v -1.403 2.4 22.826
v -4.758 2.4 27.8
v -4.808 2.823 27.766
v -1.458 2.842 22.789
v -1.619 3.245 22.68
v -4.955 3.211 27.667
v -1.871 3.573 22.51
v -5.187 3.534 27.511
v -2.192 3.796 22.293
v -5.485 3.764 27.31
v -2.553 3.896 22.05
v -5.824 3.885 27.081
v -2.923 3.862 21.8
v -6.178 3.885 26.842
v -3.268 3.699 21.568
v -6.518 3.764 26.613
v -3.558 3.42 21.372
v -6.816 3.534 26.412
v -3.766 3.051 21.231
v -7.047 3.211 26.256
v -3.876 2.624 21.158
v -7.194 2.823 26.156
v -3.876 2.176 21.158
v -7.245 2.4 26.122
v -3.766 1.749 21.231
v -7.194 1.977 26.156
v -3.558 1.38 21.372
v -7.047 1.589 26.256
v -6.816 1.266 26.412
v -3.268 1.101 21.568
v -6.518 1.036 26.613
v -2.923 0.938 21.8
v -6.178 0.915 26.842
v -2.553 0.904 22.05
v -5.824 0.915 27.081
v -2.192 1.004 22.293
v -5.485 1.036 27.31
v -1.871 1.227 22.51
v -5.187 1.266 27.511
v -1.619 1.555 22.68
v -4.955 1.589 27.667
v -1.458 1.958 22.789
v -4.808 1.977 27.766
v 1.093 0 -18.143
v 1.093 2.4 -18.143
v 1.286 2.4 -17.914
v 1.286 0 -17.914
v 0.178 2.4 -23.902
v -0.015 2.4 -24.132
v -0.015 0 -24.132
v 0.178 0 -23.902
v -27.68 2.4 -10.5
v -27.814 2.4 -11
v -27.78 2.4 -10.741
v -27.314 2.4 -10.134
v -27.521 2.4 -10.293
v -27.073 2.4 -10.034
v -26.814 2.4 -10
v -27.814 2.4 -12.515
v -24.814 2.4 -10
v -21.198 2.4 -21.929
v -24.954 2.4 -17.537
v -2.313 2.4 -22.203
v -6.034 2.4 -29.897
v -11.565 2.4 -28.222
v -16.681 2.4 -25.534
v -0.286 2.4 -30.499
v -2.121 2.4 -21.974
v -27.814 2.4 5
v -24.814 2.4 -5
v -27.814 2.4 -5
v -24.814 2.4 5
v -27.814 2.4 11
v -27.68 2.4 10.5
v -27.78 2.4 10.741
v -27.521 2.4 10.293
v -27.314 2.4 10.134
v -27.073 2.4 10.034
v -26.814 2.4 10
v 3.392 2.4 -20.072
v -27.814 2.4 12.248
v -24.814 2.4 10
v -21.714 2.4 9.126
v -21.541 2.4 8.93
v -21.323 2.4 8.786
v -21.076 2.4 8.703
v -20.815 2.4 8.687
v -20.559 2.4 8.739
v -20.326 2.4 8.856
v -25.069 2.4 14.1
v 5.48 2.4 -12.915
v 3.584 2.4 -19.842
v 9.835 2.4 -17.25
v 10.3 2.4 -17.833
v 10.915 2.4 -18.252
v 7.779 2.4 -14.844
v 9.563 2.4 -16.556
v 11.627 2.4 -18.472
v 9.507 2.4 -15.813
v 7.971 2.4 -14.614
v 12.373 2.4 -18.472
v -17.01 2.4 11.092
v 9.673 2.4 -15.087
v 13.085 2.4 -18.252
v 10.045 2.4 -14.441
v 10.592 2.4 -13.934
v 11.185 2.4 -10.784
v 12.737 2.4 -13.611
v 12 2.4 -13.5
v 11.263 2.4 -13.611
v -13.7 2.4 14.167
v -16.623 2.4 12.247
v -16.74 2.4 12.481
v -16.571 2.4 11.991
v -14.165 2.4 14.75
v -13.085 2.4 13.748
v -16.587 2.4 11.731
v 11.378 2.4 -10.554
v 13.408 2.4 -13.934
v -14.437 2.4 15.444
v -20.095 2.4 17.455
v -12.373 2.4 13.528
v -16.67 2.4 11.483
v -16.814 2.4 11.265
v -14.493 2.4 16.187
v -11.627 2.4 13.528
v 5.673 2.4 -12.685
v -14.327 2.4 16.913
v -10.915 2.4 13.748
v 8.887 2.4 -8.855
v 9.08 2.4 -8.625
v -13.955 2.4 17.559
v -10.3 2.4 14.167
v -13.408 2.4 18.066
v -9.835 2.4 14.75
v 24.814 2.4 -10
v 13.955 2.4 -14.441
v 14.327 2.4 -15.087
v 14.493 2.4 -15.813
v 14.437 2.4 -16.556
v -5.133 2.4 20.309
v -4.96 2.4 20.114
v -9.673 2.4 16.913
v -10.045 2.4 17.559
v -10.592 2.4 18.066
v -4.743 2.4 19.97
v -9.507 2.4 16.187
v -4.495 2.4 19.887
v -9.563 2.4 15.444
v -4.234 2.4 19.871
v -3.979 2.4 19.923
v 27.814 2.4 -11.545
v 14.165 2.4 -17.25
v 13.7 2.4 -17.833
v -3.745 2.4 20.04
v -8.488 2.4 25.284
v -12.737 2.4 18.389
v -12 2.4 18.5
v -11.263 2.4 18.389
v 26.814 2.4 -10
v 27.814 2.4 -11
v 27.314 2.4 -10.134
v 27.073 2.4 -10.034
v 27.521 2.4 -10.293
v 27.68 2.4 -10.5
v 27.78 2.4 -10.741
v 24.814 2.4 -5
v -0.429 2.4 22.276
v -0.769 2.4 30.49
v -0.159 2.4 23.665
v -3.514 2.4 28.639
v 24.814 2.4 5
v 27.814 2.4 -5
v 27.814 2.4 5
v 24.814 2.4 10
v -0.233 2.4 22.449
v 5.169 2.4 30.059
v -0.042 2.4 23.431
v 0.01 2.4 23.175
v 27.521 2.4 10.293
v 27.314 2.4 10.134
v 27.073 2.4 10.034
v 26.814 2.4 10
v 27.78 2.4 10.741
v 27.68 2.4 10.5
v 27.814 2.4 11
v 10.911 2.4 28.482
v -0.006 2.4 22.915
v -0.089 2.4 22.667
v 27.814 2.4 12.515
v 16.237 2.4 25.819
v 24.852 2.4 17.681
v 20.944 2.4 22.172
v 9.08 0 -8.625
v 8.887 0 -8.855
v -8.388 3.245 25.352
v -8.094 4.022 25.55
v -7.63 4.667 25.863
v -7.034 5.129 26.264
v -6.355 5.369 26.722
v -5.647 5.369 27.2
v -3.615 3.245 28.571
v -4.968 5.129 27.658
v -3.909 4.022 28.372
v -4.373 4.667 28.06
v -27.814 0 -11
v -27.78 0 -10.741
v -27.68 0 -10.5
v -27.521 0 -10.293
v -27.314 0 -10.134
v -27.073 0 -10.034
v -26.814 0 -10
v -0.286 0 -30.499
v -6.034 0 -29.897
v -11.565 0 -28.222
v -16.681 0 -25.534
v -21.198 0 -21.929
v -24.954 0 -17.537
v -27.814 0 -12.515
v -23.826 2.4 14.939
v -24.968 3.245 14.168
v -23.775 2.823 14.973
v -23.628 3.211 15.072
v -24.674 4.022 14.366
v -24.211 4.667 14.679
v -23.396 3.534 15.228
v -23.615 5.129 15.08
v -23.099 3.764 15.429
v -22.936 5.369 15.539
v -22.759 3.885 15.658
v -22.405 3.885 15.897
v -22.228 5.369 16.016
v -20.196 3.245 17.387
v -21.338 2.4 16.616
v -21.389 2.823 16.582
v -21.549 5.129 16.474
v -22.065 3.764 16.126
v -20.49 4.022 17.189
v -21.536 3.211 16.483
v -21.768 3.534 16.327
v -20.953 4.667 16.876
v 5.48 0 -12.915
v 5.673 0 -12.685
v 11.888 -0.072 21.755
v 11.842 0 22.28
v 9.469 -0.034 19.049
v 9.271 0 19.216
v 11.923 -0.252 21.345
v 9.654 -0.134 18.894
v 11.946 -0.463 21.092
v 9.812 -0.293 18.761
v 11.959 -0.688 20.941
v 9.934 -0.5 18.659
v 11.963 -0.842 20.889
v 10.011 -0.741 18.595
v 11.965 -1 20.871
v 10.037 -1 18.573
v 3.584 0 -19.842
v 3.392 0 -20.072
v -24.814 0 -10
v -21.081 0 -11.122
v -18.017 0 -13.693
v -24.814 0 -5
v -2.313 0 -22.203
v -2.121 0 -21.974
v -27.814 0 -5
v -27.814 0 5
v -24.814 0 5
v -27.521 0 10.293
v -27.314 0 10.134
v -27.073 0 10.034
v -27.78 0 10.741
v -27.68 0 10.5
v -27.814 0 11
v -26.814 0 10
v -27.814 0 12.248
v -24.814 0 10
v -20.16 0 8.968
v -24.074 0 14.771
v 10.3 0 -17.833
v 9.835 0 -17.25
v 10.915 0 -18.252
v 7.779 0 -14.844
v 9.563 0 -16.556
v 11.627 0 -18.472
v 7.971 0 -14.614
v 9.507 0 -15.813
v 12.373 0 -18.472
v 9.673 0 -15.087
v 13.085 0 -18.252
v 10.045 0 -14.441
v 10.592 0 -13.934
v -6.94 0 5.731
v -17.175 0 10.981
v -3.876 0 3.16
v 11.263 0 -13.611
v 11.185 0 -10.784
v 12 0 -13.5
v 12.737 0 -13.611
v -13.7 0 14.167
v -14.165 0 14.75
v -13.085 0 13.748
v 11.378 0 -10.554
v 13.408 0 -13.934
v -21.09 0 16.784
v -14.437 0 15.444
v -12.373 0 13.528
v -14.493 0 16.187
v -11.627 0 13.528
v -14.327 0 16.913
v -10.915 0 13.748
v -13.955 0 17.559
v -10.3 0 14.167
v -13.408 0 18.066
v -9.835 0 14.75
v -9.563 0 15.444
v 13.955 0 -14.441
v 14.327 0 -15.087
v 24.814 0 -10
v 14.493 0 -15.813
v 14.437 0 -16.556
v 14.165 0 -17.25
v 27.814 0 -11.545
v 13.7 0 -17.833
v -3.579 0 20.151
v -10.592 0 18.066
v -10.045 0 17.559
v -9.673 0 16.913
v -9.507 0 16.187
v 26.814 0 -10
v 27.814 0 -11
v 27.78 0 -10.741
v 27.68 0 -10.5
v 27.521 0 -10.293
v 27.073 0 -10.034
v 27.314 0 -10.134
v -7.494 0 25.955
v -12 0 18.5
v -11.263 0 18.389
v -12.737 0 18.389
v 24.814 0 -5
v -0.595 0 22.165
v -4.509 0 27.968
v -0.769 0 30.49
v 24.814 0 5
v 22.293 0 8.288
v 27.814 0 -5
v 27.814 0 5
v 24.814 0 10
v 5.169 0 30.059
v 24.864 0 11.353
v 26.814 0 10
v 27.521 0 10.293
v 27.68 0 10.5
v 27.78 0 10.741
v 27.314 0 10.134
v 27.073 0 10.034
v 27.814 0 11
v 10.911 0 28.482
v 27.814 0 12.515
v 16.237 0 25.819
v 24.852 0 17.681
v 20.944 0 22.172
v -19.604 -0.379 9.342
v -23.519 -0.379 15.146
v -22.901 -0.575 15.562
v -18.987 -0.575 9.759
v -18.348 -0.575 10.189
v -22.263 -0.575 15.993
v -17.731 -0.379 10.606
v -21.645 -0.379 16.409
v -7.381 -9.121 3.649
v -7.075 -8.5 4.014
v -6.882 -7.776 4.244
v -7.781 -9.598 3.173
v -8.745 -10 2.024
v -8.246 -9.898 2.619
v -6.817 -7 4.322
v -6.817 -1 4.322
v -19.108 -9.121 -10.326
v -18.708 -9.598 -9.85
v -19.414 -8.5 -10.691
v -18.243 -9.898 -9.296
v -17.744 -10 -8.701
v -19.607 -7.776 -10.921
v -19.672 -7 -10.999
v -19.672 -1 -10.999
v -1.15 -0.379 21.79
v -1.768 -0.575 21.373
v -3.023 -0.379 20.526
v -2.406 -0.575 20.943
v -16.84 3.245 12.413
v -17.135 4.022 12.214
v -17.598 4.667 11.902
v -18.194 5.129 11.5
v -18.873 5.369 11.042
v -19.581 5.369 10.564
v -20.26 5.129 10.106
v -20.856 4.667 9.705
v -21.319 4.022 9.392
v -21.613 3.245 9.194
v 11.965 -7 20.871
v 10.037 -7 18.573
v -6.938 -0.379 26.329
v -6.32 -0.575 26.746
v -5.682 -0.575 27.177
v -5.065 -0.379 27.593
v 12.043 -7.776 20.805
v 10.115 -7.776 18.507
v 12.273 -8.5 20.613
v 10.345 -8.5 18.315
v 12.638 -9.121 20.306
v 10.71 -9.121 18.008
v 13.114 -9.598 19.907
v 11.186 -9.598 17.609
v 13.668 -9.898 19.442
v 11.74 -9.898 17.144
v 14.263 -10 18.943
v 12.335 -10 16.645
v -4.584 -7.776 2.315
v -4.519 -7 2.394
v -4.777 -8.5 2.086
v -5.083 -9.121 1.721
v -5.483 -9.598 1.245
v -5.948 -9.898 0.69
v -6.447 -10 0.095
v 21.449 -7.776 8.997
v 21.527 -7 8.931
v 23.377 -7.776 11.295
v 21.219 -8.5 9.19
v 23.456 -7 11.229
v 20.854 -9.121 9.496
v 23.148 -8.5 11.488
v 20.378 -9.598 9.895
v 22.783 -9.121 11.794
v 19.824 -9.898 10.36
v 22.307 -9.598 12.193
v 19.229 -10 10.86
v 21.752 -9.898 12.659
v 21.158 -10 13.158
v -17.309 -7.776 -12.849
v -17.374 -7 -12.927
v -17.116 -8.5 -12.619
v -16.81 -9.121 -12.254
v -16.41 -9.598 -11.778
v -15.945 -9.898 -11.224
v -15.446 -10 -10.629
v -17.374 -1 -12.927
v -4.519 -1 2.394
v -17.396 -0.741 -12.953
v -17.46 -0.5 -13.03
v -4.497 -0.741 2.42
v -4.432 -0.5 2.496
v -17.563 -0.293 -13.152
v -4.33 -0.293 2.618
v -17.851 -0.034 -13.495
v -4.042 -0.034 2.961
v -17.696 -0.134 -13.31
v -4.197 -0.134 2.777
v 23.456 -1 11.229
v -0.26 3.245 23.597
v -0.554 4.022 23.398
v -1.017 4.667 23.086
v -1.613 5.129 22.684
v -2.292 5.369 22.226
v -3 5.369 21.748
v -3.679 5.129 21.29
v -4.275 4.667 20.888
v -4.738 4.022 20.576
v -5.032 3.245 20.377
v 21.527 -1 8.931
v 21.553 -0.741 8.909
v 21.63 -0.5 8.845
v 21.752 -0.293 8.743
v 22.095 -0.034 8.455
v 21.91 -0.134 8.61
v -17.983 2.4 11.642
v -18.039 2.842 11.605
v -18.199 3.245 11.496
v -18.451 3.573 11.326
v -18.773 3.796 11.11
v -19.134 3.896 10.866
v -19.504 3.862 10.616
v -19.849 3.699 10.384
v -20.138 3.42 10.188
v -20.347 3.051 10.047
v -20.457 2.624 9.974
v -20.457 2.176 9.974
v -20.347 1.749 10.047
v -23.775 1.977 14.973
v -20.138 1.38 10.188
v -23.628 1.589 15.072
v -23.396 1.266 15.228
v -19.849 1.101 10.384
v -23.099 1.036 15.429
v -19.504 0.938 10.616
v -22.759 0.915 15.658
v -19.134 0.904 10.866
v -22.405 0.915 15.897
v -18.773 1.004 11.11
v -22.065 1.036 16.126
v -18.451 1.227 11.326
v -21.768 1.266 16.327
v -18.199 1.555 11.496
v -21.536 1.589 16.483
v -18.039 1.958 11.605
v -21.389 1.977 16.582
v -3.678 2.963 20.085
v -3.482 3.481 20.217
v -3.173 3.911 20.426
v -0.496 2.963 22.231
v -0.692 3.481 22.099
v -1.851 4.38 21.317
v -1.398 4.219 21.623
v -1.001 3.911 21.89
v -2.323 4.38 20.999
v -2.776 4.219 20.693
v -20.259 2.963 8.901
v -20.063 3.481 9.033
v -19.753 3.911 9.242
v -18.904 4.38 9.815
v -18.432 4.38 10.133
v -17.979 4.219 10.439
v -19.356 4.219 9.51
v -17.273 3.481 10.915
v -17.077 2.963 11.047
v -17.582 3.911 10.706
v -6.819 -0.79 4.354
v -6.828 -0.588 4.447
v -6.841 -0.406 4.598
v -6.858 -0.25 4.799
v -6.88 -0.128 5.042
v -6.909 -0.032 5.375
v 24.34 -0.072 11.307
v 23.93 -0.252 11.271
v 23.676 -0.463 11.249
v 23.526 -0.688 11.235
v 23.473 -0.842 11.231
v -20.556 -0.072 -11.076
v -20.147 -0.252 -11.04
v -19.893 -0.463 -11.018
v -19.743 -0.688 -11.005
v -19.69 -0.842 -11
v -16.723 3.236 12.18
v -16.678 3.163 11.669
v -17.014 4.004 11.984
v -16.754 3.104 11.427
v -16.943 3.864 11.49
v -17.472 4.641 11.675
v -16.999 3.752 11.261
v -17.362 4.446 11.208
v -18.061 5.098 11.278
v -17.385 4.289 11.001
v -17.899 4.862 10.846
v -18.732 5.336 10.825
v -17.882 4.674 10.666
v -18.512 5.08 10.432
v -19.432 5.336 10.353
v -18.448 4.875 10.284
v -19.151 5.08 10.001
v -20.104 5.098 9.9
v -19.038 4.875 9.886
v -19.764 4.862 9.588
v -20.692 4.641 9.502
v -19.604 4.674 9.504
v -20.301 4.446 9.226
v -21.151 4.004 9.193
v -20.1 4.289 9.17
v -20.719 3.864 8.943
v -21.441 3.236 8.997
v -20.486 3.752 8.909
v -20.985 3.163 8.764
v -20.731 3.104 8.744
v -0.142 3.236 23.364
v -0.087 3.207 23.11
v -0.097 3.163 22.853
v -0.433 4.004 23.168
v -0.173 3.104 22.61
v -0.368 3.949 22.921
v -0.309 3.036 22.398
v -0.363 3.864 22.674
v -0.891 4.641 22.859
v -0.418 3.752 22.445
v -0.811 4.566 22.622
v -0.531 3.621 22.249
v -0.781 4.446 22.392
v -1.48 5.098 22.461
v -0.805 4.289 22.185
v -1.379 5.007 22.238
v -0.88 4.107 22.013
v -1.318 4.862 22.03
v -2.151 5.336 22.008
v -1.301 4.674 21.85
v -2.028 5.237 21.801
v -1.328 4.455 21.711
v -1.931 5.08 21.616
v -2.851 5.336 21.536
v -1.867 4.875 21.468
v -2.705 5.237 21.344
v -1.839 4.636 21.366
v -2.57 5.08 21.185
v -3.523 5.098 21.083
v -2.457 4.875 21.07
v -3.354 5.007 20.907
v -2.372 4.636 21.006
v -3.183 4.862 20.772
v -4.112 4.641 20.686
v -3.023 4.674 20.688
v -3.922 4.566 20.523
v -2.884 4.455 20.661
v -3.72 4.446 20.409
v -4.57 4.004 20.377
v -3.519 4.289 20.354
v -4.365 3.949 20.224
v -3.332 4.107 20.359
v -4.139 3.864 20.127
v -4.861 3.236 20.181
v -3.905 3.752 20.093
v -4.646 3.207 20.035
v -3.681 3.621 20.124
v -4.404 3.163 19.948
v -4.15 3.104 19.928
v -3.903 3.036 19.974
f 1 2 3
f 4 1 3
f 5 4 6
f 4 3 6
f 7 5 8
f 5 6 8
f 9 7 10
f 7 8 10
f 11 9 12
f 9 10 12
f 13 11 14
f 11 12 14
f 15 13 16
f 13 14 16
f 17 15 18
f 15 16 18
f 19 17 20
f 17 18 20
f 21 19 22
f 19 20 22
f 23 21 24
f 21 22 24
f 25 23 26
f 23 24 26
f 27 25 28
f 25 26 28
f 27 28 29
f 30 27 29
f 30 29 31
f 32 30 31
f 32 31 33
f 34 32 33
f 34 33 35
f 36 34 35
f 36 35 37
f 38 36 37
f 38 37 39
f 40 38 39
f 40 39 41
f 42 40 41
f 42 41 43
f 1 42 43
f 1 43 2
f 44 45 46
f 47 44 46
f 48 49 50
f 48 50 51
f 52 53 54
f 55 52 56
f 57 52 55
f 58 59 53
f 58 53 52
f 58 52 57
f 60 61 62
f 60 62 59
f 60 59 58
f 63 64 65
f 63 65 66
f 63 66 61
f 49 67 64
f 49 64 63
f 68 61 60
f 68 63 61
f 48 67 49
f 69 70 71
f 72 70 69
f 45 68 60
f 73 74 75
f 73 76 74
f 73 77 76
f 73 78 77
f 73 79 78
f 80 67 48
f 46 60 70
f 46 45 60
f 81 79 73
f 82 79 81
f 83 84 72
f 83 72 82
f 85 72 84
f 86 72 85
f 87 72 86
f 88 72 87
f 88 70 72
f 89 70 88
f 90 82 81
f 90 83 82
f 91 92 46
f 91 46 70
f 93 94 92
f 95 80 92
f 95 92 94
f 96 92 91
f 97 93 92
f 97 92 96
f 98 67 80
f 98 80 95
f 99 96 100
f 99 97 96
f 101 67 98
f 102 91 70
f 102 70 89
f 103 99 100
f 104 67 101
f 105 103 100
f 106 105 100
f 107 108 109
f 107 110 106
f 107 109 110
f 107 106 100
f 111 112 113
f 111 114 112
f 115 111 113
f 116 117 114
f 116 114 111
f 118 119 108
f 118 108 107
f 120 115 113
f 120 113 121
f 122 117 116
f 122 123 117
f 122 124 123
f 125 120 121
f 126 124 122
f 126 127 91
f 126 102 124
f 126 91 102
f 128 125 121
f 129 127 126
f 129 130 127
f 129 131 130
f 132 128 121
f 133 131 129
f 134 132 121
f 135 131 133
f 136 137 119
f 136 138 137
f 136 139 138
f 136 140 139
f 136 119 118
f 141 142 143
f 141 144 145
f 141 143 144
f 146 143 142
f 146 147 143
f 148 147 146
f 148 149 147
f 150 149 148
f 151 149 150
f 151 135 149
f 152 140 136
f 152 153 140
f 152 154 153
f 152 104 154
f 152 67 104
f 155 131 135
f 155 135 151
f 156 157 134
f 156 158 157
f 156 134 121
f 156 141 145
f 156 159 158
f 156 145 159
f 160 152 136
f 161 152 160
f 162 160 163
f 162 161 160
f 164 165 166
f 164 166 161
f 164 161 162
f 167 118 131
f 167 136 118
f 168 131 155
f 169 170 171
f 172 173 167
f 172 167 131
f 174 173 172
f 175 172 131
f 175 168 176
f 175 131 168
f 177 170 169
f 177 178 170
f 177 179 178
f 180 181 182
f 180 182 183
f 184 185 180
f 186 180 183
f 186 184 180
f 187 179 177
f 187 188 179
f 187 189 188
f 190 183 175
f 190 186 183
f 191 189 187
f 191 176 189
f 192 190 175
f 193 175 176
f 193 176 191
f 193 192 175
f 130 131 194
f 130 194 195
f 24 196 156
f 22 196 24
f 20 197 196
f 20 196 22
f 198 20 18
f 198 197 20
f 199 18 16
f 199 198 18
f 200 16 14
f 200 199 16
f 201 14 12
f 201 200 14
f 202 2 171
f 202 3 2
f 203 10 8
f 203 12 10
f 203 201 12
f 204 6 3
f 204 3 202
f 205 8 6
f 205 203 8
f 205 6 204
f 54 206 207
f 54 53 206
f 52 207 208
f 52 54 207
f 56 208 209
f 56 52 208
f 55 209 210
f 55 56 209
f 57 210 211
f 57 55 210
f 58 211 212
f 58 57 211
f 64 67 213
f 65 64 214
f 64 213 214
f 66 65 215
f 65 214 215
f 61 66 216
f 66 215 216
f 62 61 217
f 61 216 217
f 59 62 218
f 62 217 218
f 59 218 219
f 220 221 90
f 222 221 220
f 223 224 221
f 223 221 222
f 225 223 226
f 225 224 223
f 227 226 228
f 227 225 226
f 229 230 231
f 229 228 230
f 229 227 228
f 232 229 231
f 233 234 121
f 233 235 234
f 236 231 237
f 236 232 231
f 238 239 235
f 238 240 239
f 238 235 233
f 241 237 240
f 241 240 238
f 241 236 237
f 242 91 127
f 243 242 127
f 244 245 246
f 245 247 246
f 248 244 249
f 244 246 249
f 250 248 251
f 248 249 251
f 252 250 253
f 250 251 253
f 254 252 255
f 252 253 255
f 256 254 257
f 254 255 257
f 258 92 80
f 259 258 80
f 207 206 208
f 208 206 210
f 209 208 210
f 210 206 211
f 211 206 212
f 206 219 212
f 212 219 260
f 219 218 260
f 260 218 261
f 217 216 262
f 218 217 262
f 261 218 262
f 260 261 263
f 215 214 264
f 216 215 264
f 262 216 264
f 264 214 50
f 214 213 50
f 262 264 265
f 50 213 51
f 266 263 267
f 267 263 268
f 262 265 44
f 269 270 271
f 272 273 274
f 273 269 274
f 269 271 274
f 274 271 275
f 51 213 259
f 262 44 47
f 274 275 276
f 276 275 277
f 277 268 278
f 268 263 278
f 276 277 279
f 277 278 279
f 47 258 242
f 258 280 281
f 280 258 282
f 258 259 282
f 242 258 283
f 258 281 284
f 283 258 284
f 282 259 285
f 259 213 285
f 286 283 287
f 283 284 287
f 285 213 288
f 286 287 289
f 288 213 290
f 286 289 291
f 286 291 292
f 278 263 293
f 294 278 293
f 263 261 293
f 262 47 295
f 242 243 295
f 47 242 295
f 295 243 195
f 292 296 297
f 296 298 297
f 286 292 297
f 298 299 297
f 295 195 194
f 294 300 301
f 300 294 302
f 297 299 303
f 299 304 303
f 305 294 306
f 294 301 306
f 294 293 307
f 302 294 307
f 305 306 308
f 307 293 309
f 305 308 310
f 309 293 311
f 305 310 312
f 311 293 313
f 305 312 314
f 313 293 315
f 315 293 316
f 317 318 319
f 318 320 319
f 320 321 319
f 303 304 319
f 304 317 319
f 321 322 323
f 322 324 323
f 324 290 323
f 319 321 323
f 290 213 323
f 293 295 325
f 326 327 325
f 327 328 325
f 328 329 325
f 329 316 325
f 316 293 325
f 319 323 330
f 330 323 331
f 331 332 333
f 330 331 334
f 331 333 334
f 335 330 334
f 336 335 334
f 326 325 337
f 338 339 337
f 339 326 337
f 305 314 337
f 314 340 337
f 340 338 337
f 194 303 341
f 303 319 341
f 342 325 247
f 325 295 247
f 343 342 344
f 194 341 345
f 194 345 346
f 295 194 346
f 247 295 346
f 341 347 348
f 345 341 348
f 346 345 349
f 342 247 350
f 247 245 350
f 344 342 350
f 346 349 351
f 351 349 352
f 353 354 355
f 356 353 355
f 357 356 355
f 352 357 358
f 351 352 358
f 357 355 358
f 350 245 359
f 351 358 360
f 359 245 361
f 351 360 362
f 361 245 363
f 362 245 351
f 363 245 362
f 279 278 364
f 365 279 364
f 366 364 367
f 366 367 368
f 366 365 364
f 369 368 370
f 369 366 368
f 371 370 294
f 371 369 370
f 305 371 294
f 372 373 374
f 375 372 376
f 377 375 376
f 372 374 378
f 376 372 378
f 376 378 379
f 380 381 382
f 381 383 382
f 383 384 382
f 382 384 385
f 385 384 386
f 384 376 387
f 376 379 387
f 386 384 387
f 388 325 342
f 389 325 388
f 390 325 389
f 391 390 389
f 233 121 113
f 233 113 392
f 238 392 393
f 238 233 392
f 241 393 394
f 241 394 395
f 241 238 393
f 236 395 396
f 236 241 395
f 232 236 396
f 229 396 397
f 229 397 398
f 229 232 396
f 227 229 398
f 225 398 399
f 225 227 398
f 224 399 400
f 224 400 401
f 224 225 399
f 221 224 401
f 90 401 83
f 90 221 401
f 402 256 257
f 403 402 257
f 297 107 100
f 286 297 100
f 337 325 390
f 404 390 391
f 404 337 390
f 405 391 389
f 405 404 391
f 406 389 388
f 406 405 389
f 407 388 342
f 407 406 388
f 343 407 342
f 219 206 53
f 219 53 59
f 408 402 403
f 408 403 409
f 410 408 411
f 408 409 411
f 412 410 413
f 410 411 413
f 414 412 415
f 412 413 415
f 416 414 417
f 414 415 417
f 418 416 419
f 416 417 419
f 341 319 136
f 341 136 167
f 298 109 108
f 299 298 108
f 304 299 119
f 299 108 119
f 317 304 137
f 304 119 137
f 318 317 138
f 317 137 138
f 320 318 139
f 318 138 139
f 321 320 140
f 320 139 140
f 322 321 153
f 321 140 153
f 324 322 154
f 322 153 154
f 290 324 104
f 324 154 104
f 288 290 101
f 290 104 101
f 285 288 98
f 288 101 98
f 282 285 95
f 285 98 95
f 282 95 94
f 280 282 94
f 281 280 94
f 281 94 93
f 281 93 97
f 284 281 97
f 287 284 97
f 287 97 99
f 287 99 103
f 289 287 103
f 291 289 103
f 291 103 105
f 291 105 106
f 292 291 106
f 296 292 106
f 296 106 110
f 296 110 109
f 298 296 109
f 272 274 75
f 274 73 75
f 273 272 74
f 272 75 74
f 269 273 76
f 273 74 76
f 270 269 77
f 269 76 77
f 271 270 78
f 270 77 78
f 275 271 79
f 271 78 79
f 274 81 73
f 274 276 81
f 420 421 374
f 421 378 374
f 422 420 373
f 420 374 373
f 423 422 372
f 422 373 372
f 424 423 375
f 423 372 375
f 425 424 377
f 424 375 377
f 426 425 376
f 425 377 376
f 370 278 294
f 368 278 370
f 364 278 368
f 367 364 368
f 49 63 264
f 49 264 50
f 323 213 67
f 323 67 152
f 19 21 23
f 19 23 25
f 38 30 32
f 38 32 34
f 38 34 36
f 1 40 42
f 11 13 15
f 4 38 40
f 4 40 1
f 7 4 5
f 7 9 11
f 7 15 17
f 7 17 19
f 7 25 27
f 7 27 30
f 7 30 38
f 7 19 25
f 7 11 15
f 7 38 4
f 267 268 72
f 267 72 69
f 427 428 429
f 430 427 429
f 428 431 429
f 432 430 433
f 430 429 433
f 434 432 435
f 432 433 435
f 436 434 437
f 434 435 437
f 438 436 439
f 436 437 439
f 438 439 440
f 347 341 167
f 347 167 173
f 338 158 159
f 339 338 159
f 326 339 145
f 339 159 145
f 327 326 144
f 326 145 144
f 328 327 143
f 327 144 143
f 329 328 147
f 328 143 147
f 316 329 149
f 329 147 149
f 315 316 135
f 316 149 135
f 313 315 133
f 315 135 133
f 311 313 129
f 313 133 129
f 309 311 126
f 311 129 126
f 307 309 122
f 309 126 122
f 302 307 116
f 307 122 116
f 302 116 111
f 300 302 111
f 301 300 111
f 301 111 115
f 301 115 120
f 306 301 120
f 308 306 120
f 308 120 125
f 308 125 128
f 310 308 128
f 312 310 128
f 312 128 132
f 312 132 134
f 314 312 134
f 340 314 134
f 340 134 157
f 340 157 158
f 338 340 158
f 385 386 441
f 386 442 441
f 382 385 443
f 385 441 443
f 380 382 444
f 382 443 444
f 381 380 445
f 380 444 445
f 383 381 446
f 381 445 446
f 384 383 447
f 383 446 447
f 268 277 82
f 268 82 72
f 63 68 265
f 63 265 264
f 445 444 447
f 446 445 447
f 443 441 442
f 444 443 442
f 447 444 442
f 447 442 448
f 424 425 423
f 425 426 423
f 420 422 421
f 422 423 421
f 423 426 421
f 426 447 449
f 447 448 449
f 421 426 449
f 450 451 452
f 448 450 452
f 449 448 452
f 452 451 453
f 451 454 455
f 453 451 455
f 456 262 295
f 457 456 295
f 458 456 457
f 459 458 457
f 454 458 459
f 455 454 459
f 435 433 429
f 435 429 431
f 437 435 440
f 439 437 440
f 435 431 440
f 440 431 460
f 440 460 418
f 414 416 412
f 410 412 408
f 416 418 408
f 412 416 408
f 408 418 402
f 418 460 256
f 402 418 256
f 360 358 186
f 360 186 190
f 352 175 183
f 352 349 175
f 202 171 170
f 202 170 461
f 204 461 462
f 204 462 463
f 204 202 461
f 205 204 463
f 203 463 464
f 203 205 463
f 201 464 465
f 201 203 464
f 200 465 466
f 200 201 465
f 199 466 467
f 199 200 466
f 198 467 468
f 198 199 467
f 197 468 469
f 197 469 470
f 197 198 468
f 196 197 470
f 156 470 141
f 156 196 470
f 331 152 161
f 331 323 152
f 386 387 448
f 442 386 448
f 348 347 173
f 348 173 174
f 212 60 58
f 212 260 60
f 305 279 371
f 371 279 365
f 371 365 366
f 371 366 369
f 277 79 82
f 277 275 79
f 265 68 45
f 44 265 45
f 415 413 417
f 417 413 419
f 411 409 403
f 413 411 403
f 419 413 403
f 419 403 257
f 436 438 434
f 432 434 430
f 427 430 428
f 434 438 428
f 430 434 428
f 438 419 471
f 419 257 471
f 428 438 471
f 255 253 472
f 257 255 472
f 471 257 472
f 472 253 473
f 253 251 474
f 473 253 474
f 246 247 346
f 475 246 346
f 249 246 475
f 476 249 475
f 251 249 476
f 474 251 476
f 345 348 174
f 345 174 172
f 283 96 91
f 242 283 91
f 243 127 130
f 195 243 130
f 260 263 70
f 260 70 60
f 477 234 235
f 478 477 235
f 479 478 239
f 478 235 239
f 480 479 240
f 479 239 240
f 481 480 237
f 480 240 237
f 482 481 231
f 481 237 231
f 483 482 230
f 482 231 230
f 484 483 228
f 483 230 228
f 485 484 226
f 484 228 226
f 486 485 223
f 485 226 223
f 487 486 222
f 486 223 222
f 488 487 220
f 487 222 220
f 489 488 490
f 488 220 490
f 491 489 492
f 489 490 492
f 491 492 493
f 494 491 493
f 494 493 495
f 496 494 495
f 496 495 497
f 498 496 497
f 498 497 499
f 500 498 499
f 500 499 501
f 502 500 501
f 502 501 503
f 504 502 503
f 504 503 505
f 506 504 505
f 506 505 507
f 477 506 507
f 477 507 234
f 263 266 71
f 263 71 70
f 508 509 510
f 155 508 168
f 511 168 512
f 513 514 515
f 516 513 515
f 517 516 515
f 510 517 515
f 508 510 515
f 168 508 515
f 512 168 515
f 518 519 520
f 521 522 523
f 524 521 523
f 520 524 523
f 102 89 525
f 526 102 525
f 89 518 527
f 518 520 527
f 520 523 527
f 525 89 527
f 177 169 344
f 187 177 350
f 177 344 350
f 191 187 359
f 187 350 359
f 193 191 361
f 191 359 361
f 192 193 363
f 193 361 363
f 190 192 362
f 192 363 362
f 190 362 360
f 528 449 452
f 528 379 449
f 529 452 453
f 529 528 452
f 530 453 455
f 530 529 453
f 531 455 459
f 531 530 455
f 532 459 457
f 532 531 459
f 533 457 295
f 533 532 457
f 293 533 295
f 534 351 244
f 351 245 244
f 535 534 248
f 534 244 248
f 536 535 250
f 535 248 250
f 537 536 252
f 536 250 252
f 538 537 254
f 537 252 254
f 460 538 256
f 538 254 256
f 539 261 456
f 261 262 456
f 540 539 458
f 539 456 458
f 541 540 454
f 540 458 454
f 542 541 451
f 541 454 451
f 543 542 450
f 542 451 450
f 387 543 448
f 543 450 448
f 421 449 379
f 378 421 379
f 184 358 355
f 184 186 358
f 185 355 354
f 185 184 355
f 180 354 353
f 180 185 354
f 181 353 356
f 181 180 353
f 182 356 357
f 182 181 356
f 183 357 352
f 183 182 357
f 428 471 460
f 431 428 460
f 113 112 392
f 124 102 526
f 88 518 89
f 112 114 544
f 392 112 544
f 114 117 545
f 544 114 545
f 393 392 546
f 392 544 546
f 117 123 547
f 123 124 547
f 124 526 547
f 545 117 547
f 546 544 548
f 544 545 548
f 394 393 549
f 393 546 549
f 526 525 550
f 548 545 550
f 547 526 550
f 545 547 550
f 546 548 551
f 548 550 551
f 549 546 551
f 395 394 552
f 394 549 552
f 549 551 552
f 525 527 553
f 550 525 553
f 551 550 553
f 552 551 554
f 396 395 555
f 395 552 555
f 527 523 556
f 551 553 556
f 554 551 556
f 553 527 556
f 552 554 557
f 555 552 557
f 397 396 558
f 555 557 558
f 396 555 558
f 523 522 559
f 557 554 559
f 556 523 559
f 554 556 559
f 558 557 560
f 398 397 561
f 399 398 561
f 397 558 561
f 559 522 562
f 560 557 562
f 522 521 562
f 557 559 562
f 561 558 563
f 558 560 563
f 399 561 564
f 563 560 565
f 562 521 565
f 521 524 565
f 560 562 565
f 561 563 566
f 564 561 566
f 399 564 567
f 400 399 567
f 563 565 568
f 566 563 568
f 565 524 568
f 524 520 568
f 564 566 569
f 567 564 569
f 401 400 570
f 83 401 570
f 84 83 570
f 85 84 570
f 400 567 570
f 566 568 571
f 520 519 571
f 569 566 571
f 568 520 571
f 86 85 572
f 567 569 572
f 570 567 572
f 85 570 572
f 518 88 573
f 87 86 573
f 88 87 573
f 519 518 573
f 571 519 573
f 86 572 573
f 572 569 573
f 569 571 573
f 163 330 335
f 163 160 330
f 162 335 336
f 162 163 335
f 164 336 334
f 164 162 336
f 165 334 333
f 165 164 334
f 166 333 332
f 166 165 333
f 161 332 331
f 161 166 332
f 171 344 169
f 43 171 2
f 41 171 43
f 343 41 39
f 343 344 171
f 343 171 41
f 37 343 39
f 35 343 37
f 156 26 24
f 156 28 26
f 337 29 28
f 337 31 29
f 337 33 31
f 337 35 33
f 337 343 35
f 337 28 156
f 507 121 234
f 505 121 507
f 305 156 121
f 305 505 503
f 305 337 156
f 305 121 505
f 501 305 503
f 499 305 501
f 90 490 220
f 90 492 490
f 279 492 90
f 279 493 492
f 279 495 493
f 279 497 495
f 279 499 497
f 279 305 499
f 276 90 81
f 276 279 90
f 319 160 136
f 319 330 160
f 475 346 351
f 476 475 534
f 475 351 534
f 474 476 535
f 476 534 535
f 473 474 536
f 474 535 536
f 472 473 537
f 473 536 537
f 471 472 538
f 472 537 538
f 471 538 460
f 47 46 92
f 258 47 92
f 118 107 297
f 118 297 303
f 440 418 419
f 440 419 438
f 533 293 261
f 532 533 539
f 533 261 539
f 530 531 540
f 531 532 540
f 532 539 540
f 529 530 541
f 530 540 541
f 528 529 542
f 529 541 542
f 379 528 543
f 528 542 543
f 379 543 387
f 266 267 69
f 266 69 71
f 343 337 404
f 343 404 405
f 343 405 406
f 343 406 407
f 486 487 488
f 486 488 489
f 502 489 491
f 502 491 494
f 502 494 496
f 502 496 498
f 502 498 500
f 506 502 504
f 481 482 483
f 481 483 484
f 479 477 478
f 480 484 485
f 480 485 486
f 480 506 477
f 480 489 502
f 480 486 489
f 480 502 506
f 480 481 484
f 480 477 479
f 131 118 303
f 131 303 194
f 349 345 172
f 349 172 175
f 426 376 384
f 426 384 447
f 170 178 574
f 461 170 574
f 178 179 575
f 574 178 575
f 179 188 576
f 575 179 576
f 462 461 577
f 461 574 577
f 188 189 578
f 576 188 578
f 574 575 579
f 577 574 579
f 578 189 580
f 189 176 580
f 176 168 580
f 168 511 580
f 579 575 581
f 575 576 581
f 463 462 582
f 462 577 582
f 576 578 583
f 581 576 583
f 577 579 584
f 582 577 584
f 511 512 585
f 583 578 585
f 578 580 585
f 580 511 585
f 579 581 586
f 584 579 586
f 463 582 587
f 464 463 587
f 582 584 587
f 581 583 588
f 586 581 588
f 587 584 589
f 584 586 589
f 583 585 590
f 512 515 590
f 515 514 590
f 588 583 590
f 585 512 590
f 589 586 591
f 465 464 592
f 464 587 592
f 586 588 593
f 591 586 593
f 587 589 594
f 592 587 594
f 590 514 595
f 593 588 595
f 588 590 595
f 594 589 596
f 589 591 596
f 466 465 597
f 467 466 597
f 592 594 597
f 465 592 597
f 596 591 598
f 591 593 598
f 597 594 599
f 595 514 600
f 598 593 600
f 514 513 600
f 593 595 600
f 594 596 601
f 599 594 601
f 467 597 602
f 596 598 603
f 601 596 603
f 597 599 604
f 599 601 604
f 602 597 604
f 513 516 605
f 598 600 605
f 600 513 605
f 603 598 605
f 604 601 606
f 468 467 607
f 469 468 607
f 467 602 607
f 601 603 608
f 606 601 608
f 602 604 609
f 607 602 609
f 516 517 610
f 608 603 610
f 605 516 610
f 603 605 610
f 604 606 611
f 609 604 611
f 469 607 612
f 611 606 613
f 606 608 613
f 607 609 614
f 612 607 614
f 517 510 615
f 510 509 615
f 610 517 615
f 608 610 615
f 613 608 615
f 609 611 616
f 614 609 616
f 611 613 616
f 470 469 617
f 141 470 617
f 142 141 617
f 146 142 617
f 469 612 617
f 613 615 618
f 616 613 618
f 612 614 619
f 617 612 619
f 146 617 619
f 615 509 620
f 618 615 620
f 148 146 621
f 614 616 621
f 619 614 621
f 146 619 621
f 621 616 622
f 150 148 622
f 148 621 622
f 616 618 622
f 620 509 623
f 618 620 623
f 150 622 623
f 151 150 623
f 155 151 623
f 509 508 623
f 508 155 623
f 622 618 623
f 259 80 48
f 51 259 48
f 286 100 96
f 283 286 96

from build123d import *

# Parameters (mm, degrees)
CROQUIS1_R              = 30.5
SALIENTE_EXTRUIR1_DEPTH = 2.4
CORTAR_EXTRUIR3_START   = -4
CORTAR_EXTRUIR3_DEPTH   = 4
CORTAR_EXTRUIR6_DEPTH   = 10
CROQUIS10_R             = 2.5
CORTAR_EXTRUIR7_DEPTH   = 10
CORTAR_EXTRUIR8_START   = -3
CORTAR_EXTRUIR8_DEPTH   = 3
SALIENTE_EXTRUIR2_DEPTH = 10
REDONDEO1_R             = 3
REDONDEO2_R             = 1
CORTAR_EXTRUIR9_START   = -3
CORTAR_EXTRUIR9_DEPTH   = 3
CORTAR_EXTRUIR10_START  = -10
CORTAR_EXTRUIR10_DEPTH  = 10
CROQUIS19_R             = 3
SALIENTE_EXTRUIR5_DEPTH = 7
CROQUIS20_R             = 1.5
CORTAR_EXTRUIR12_DEPTH  = 6
REDONDEO3_R             = 1
REDONDEO4_R             = 1
CORTAR_EXTRUIR13_DEPTH  = 3


with BuildPart() as part:
    # Croquis1 → Saliente-Extruir1 (new body)
    with BuildSketch(Plane(origin=(0, 0, 0), x_dir=(1, 0, 0), z_dir=(0, 1, 0))):
        with Locations(Location((0, 0, 0), (0, 0, 270))):
            Circle(CROQUIS1_R)
    extrude(amount=SALIENTE_EXTRUIR1_DEPTH)

    # Croquis5 → Cortar-Extruir3 (cut)
    with BuildSketch(Plane(origin=(0, 2.4, 0), x_dir=(1, 0, 0), z_dir=(0, 1, 0)).offset(CORTAR_EXTRUIR3_START)):
        with BuildLine():
            Line((28.814059068, 5), (30.087372767, 5))
            ThreePointArc((30.087372767, 5), (29.556634924, 7.526973624), (28.814059068, 10))
            Line((28.814059068, 10), (24.814059068, 10))
            Line((24.814059068, 10), (24.814059068, 5))
            Line((24.814059068, 5), (28.814059068, 5))
        make_face()
        with BuildLine():
            Line((30.087372767, -5), (28.814059068, -5))
            Line((28.814059068, -5), (24.814059068, -5))
            Line((24.814059068, -5), (24.814059068, -10))
            Line((24.814059068, -10), (28.814059068, -10))
            ThreePointArc((28.814059068, -10), (29.556634924, -7.526973624), (30.087372767, -5))
        make_face()
        with BuildLine():
            Line((-24.814059068, 5), (-24.814059068, 10))
            Line((-24.814059068, 10), (-28.814059068, 10))
            ThreePointArc((-28.814059068, 10), (-29.556634924, 7.526973624), (-30.087372767, 5))
            Line((-30.087372767, 5), (-28.814059068, 5))
            Line((-28.814059068, 5), (-24.814059068, 5))
        make_face()
        with BuildLine():
            Line((-28.814059068, -10), (-24.814059068, -10))
            Line((-24.814059068, -10), (-24.814059068, -5))
            Line((-24.814059068, -5), (-28.814059068, -5))
            Line((-28.814059068, -5), (-30.087372767, -5))
            ThreePointArc((-30.087372767, -5), (-29.556634924, -7.526973624), (-28.814059068, -10))
        make_face()
    extrude(amount=CORTAR_EXTRUIR3_DEPTH, mode=Mode.SUBTRACT)

    # Croquis9 → Cortar-Extruir6 (cut)
    with BuildSketch(Plane(origin=(0, 2.4, 0), x_dir=(1, 0, 0), z_dir=(0, 1, 0))):
        Polygon((5.673284852, 12.685390231), (8.887222901, 8.855168016), (11.18535623, 10.783530845), (7.971418181, 14.613753061), align=None)
        Polygon((-2.120514915, 21.973679104), (1.093423133, 18.143456889), (3.391556462, 20.071819718), (0.177618414, 23.902041933), align=None)
    extrude(amount=-CORTAR_EXTRUIR6_DEPTH, mode=Mode.SUBTRACT)

    # Croquis10 → Cortar-Extruir7 (cut)
    with BuildSketch(Plane(origin=(0, 2.4, 0), x_dir=(1, 0, 0), z_dir=(0, 1, 0))):
        with Locations(Location((12, 16, 0), (0, 0, 270))):
            Circle(CROQUIS10_R)
        with Locations(Location((-12, -16, 0), (0, 0, 270))):
            Circle(CROQUIS10_R)
    extrude(amount=-CORTAR_EXTRUIR7_DEPTH, mode=Mode.SUBTRACT)

    # Croquis11 → Cortar-Extruir8 (cut)
    with BuildSketch(Plane(origin=(0, 2.4, 0), x_dir=(1, 0, 0), z_dir=(0, 1, 0)).offset(CORTAR_EXTRUIR8_START)):
        with BuildLine():
            ThreePointArc((-28.814059068, -10), (-28.341972277, -11.268655974), (-27.814059068, -12.515115586))
            Line((-27.814059068, -12.515115586), (-27.814059068, -10))
            Line((-27.814059068, -10), (-28.814059068, -10))
        make_face()
        with BuildLine():
            Line((-27.814059068, -5), (-27.814059068, 5))
            Line((-27.814059068, 5), (-30.087372767, 5))
            ThreePointArc((-30.087372767, 5), (-30.5, 0), (-30.087372767, -5))
            Line((-30.087372767, -5), (-27.814059068, -5))
        make_face()
        with BuildLine():
            Line((-27.814059068, 10), (-27.814059068, 12.515115586))
            ThreePointArc((-27.814059068, 12.515115586), (-28.341972277, 11.268655974), (-28.814059068, 10))
            Line((-28.814059068, 10), (-27.814059068, 10))
        make_face()
        with BuildLine():
            Line((28.814059068, -10), (27.814059068, -10))
            Line((27.814059068, -10), (27.814059068, -12.515115586))
            ThreePointArc((27.814059068, -12.515115586), (28.341972277, -11.268655974), (28.814059068, -10))
        make_face()
        with BuildLine():
            Line((30.087372767, 5), (27.814059068, 5))
            Line((27.814059068, 5), (27.814059068, -5))
            Line((27.814059068, -5), (30.087372767, -5))
            ThreePointArc((30.087372767, -5), (30.5, 0), (30.087372767, 5))
        make_face()
        with BuildLine():
            Line((27.814059068, 12.515115586), (27.814059068, 10))
            Line((27.814059068, 10), (28.814059068, 10))
            ThreePointArc((28.814059068, 10), (28.341972277, 11.268655974), (27.814059068, 12.515115586))
        make_face()
    extrude(amount=CORTAR_EXTRUIR8_DEPTH, mode=Mode.SUBTRACT)

    # Croquis13 → Saliente-Extruir2 (add)
    with BuildSketch(Plane.XZ):
        Polygon((-6.816688183, 4.321977983), (-19.672440377, -10.99891088), (-17.374307048, -12.927273709), (-4.518554854, 2.393615154), align=None)
        Polygon((21.527275636, 8.931176939), (23.455638465, 11.229310268), (11.964971818, 20.871124414), (10.036608989, 18.572991084), align=None)
    extrude(amount=SALIENTE_EXTRUIR2_DEPTH)

    # Redondeo1
    redondeo1_edges = [part.edges().sort_by_distance(p)[0] for p in [
        (-5.667621519, -10, 3.357796568),
        (-18.523373712, -10, -11.963092294),
        (22.49145705, -10, 10.080243604),
        (11.000790403, -10, 19.722057749),
    ]]
    fillet(redondeo1_edges, radius=REDONDEO1_R)

    # Redondeo2
    redondeo2_edges = [part.edges().sort_by_distance(p)[0] for p in [
        (-5.667621519, 0, 3.357796568),
        (-13.24456428, 0, -3.338466449),
        (-18.523373712, 0, -11.963092294),
        (22.49145705, 0, 10.080243604),
        (17.710305141, 0, 16.050217341),
        (11.000790403, 0, 19.722057749),
    ]]
    fillet(redondeo2_edges, radius=REDONDEO2_R)

    # Croquis14 → Cortar-Extruir9 (cut)
    with BuildSketch(Plane(origin=(0, 2.4, 0), x_dir=(1, 0, 0), z_dir=(0, 1, 0)).offset(CORTAR_EXTRUIR9_START)):
        with BuildLine():
            Line((-0.28585192, 30.498660441), (27.814059068, 11.545031156))
            Line((27.814059068, 11.545031156), (27.814059068, 12.515115586))
            ThreePointArc((27.814059068, 12.515115586), (16.440879495, 25.689442995), (-0.28585192, 30.498660441))
        make_face()
    extrude(amount=CORTAR_EXTRUIR9_DEPTH, mode=Mode.SUBTRACT)

    # Croquis15 → Cortar-Extruir10 (cut)
    with BuildSketch(Plane(origin=(0, 2.4, 0), x_dir=(1, 0, 0), z_dir=(0, 1, 0)).offset(CORTAR_EXTRUIR10_START)):
        with BuildLine():
            Line((-27.814059068, -12.24829445), (-27.814059068, -12.515115586))
            ThreePointArc((-27.814059068, -12.515115586), (-16.882746118, -25.401237834), (-0.769174213, -30.490299622))
            Line((-0.769174213, -30.490299622), (-27.814059068, -12.24829445))
        make_face()
    extrude(amount=CORTAR_EXTRUIR10_DEPTH, mode=Mode.SUBTRACT)

    # Croquis19 → Saliente-Extruir5 (add)
    with BuildSketch(Plane(origin=(-14.375575006, 0, 21.312666404), x_dir=(0.8290375725550415, 0, 0.5591929034707471), z_dir=(-0.5591929034707471, 0, 0.8290375725550415))):
        with Locations((10.101272087, 2.4)):
            Circle(CROQUIS19_R)
        with Locations((-9.898727913, 2.4)):
            Circle(CROQUIS19_R)
    extrude(amount=-SALIENTE_EXTRUIR5_DEPTH)

    # Croquis20 → Cortar-Extruir12 (cut)
    with BuildSketch(Plane(origin=(-14.375575006, 0, 21.312666404), x_dir=(0.8290375725550415, 0, 0.5591929034707471), z_dir=(-0.5591929034707471, 0, 0.8290375725550415))):
        with Locations((10.101272087, 2.4)):
            Circle(CROQUIS20_R)
        with Locations((-9.898727913, 2.4)):
            Circle(CROQUIS20_R)
    extrude(amount=-CORTAR_EXTRUIR12_DEPTH, mode=Mode.SUBTRACT)

    # Redondeo3
    redondeo3_edges = [part.edges().sort_by_distance(p)[0] for p in [
        (-2.086890591, 5.4, 21.157963063),
        (-18.667642042, 5.4, 9.974104993),
    ]]
    fillet(redondeo3_edges, radius=REDONDEO3_R)

    # Redondeo4
    redondeo4_edges = [part.edges().sort_by_distance(p)[0] for p in [
        (-27.814059068, 1.2, 10),
        (-27.814059068, 1.2, -10),
        (27.814059068, 1.2, 10),
        (27.814059068, 1.2, -10),
    ]]
    fillet(redondeo4_edges, radius=REDONDEO4_R)

    # Croquis21 → Cortar-Extruir13 (cut)
    with BuildSketch(Plane(origin=(0, 2.4, 0), x_dir=(1, 0, 0), z_dir=(0, 1, 0))):
        Polygon((5.673284852, 12.685390231), (7.971418181, 14.613753061), (7.778581899, 14.843566393), (5.480448569, 12.915203564), align=None)
        Polygon((3.391556462, 20.071819718), (1.093423133, 18.143456889), (1.286259416, 17.913643556), (3.584392745, 19.842006385), align=None)
        Polygon((0.177618414, 23.902041933), (-2.120514915, 21.973679104), (-2.313351198, 22.203492437), (-0.015217869, 24.131855266), align=None)
        Polygon((8.887222901, 8.855168016), (11.18535623, 10.783530845), (11.378192513, 10.553717512), (9.080059183, 8.625354683), align=None)
    extrude(amount=-CORTAR_EXTRUIR13_DEPTH, mode=Mode.SUBTRACT)


solid = part.part
